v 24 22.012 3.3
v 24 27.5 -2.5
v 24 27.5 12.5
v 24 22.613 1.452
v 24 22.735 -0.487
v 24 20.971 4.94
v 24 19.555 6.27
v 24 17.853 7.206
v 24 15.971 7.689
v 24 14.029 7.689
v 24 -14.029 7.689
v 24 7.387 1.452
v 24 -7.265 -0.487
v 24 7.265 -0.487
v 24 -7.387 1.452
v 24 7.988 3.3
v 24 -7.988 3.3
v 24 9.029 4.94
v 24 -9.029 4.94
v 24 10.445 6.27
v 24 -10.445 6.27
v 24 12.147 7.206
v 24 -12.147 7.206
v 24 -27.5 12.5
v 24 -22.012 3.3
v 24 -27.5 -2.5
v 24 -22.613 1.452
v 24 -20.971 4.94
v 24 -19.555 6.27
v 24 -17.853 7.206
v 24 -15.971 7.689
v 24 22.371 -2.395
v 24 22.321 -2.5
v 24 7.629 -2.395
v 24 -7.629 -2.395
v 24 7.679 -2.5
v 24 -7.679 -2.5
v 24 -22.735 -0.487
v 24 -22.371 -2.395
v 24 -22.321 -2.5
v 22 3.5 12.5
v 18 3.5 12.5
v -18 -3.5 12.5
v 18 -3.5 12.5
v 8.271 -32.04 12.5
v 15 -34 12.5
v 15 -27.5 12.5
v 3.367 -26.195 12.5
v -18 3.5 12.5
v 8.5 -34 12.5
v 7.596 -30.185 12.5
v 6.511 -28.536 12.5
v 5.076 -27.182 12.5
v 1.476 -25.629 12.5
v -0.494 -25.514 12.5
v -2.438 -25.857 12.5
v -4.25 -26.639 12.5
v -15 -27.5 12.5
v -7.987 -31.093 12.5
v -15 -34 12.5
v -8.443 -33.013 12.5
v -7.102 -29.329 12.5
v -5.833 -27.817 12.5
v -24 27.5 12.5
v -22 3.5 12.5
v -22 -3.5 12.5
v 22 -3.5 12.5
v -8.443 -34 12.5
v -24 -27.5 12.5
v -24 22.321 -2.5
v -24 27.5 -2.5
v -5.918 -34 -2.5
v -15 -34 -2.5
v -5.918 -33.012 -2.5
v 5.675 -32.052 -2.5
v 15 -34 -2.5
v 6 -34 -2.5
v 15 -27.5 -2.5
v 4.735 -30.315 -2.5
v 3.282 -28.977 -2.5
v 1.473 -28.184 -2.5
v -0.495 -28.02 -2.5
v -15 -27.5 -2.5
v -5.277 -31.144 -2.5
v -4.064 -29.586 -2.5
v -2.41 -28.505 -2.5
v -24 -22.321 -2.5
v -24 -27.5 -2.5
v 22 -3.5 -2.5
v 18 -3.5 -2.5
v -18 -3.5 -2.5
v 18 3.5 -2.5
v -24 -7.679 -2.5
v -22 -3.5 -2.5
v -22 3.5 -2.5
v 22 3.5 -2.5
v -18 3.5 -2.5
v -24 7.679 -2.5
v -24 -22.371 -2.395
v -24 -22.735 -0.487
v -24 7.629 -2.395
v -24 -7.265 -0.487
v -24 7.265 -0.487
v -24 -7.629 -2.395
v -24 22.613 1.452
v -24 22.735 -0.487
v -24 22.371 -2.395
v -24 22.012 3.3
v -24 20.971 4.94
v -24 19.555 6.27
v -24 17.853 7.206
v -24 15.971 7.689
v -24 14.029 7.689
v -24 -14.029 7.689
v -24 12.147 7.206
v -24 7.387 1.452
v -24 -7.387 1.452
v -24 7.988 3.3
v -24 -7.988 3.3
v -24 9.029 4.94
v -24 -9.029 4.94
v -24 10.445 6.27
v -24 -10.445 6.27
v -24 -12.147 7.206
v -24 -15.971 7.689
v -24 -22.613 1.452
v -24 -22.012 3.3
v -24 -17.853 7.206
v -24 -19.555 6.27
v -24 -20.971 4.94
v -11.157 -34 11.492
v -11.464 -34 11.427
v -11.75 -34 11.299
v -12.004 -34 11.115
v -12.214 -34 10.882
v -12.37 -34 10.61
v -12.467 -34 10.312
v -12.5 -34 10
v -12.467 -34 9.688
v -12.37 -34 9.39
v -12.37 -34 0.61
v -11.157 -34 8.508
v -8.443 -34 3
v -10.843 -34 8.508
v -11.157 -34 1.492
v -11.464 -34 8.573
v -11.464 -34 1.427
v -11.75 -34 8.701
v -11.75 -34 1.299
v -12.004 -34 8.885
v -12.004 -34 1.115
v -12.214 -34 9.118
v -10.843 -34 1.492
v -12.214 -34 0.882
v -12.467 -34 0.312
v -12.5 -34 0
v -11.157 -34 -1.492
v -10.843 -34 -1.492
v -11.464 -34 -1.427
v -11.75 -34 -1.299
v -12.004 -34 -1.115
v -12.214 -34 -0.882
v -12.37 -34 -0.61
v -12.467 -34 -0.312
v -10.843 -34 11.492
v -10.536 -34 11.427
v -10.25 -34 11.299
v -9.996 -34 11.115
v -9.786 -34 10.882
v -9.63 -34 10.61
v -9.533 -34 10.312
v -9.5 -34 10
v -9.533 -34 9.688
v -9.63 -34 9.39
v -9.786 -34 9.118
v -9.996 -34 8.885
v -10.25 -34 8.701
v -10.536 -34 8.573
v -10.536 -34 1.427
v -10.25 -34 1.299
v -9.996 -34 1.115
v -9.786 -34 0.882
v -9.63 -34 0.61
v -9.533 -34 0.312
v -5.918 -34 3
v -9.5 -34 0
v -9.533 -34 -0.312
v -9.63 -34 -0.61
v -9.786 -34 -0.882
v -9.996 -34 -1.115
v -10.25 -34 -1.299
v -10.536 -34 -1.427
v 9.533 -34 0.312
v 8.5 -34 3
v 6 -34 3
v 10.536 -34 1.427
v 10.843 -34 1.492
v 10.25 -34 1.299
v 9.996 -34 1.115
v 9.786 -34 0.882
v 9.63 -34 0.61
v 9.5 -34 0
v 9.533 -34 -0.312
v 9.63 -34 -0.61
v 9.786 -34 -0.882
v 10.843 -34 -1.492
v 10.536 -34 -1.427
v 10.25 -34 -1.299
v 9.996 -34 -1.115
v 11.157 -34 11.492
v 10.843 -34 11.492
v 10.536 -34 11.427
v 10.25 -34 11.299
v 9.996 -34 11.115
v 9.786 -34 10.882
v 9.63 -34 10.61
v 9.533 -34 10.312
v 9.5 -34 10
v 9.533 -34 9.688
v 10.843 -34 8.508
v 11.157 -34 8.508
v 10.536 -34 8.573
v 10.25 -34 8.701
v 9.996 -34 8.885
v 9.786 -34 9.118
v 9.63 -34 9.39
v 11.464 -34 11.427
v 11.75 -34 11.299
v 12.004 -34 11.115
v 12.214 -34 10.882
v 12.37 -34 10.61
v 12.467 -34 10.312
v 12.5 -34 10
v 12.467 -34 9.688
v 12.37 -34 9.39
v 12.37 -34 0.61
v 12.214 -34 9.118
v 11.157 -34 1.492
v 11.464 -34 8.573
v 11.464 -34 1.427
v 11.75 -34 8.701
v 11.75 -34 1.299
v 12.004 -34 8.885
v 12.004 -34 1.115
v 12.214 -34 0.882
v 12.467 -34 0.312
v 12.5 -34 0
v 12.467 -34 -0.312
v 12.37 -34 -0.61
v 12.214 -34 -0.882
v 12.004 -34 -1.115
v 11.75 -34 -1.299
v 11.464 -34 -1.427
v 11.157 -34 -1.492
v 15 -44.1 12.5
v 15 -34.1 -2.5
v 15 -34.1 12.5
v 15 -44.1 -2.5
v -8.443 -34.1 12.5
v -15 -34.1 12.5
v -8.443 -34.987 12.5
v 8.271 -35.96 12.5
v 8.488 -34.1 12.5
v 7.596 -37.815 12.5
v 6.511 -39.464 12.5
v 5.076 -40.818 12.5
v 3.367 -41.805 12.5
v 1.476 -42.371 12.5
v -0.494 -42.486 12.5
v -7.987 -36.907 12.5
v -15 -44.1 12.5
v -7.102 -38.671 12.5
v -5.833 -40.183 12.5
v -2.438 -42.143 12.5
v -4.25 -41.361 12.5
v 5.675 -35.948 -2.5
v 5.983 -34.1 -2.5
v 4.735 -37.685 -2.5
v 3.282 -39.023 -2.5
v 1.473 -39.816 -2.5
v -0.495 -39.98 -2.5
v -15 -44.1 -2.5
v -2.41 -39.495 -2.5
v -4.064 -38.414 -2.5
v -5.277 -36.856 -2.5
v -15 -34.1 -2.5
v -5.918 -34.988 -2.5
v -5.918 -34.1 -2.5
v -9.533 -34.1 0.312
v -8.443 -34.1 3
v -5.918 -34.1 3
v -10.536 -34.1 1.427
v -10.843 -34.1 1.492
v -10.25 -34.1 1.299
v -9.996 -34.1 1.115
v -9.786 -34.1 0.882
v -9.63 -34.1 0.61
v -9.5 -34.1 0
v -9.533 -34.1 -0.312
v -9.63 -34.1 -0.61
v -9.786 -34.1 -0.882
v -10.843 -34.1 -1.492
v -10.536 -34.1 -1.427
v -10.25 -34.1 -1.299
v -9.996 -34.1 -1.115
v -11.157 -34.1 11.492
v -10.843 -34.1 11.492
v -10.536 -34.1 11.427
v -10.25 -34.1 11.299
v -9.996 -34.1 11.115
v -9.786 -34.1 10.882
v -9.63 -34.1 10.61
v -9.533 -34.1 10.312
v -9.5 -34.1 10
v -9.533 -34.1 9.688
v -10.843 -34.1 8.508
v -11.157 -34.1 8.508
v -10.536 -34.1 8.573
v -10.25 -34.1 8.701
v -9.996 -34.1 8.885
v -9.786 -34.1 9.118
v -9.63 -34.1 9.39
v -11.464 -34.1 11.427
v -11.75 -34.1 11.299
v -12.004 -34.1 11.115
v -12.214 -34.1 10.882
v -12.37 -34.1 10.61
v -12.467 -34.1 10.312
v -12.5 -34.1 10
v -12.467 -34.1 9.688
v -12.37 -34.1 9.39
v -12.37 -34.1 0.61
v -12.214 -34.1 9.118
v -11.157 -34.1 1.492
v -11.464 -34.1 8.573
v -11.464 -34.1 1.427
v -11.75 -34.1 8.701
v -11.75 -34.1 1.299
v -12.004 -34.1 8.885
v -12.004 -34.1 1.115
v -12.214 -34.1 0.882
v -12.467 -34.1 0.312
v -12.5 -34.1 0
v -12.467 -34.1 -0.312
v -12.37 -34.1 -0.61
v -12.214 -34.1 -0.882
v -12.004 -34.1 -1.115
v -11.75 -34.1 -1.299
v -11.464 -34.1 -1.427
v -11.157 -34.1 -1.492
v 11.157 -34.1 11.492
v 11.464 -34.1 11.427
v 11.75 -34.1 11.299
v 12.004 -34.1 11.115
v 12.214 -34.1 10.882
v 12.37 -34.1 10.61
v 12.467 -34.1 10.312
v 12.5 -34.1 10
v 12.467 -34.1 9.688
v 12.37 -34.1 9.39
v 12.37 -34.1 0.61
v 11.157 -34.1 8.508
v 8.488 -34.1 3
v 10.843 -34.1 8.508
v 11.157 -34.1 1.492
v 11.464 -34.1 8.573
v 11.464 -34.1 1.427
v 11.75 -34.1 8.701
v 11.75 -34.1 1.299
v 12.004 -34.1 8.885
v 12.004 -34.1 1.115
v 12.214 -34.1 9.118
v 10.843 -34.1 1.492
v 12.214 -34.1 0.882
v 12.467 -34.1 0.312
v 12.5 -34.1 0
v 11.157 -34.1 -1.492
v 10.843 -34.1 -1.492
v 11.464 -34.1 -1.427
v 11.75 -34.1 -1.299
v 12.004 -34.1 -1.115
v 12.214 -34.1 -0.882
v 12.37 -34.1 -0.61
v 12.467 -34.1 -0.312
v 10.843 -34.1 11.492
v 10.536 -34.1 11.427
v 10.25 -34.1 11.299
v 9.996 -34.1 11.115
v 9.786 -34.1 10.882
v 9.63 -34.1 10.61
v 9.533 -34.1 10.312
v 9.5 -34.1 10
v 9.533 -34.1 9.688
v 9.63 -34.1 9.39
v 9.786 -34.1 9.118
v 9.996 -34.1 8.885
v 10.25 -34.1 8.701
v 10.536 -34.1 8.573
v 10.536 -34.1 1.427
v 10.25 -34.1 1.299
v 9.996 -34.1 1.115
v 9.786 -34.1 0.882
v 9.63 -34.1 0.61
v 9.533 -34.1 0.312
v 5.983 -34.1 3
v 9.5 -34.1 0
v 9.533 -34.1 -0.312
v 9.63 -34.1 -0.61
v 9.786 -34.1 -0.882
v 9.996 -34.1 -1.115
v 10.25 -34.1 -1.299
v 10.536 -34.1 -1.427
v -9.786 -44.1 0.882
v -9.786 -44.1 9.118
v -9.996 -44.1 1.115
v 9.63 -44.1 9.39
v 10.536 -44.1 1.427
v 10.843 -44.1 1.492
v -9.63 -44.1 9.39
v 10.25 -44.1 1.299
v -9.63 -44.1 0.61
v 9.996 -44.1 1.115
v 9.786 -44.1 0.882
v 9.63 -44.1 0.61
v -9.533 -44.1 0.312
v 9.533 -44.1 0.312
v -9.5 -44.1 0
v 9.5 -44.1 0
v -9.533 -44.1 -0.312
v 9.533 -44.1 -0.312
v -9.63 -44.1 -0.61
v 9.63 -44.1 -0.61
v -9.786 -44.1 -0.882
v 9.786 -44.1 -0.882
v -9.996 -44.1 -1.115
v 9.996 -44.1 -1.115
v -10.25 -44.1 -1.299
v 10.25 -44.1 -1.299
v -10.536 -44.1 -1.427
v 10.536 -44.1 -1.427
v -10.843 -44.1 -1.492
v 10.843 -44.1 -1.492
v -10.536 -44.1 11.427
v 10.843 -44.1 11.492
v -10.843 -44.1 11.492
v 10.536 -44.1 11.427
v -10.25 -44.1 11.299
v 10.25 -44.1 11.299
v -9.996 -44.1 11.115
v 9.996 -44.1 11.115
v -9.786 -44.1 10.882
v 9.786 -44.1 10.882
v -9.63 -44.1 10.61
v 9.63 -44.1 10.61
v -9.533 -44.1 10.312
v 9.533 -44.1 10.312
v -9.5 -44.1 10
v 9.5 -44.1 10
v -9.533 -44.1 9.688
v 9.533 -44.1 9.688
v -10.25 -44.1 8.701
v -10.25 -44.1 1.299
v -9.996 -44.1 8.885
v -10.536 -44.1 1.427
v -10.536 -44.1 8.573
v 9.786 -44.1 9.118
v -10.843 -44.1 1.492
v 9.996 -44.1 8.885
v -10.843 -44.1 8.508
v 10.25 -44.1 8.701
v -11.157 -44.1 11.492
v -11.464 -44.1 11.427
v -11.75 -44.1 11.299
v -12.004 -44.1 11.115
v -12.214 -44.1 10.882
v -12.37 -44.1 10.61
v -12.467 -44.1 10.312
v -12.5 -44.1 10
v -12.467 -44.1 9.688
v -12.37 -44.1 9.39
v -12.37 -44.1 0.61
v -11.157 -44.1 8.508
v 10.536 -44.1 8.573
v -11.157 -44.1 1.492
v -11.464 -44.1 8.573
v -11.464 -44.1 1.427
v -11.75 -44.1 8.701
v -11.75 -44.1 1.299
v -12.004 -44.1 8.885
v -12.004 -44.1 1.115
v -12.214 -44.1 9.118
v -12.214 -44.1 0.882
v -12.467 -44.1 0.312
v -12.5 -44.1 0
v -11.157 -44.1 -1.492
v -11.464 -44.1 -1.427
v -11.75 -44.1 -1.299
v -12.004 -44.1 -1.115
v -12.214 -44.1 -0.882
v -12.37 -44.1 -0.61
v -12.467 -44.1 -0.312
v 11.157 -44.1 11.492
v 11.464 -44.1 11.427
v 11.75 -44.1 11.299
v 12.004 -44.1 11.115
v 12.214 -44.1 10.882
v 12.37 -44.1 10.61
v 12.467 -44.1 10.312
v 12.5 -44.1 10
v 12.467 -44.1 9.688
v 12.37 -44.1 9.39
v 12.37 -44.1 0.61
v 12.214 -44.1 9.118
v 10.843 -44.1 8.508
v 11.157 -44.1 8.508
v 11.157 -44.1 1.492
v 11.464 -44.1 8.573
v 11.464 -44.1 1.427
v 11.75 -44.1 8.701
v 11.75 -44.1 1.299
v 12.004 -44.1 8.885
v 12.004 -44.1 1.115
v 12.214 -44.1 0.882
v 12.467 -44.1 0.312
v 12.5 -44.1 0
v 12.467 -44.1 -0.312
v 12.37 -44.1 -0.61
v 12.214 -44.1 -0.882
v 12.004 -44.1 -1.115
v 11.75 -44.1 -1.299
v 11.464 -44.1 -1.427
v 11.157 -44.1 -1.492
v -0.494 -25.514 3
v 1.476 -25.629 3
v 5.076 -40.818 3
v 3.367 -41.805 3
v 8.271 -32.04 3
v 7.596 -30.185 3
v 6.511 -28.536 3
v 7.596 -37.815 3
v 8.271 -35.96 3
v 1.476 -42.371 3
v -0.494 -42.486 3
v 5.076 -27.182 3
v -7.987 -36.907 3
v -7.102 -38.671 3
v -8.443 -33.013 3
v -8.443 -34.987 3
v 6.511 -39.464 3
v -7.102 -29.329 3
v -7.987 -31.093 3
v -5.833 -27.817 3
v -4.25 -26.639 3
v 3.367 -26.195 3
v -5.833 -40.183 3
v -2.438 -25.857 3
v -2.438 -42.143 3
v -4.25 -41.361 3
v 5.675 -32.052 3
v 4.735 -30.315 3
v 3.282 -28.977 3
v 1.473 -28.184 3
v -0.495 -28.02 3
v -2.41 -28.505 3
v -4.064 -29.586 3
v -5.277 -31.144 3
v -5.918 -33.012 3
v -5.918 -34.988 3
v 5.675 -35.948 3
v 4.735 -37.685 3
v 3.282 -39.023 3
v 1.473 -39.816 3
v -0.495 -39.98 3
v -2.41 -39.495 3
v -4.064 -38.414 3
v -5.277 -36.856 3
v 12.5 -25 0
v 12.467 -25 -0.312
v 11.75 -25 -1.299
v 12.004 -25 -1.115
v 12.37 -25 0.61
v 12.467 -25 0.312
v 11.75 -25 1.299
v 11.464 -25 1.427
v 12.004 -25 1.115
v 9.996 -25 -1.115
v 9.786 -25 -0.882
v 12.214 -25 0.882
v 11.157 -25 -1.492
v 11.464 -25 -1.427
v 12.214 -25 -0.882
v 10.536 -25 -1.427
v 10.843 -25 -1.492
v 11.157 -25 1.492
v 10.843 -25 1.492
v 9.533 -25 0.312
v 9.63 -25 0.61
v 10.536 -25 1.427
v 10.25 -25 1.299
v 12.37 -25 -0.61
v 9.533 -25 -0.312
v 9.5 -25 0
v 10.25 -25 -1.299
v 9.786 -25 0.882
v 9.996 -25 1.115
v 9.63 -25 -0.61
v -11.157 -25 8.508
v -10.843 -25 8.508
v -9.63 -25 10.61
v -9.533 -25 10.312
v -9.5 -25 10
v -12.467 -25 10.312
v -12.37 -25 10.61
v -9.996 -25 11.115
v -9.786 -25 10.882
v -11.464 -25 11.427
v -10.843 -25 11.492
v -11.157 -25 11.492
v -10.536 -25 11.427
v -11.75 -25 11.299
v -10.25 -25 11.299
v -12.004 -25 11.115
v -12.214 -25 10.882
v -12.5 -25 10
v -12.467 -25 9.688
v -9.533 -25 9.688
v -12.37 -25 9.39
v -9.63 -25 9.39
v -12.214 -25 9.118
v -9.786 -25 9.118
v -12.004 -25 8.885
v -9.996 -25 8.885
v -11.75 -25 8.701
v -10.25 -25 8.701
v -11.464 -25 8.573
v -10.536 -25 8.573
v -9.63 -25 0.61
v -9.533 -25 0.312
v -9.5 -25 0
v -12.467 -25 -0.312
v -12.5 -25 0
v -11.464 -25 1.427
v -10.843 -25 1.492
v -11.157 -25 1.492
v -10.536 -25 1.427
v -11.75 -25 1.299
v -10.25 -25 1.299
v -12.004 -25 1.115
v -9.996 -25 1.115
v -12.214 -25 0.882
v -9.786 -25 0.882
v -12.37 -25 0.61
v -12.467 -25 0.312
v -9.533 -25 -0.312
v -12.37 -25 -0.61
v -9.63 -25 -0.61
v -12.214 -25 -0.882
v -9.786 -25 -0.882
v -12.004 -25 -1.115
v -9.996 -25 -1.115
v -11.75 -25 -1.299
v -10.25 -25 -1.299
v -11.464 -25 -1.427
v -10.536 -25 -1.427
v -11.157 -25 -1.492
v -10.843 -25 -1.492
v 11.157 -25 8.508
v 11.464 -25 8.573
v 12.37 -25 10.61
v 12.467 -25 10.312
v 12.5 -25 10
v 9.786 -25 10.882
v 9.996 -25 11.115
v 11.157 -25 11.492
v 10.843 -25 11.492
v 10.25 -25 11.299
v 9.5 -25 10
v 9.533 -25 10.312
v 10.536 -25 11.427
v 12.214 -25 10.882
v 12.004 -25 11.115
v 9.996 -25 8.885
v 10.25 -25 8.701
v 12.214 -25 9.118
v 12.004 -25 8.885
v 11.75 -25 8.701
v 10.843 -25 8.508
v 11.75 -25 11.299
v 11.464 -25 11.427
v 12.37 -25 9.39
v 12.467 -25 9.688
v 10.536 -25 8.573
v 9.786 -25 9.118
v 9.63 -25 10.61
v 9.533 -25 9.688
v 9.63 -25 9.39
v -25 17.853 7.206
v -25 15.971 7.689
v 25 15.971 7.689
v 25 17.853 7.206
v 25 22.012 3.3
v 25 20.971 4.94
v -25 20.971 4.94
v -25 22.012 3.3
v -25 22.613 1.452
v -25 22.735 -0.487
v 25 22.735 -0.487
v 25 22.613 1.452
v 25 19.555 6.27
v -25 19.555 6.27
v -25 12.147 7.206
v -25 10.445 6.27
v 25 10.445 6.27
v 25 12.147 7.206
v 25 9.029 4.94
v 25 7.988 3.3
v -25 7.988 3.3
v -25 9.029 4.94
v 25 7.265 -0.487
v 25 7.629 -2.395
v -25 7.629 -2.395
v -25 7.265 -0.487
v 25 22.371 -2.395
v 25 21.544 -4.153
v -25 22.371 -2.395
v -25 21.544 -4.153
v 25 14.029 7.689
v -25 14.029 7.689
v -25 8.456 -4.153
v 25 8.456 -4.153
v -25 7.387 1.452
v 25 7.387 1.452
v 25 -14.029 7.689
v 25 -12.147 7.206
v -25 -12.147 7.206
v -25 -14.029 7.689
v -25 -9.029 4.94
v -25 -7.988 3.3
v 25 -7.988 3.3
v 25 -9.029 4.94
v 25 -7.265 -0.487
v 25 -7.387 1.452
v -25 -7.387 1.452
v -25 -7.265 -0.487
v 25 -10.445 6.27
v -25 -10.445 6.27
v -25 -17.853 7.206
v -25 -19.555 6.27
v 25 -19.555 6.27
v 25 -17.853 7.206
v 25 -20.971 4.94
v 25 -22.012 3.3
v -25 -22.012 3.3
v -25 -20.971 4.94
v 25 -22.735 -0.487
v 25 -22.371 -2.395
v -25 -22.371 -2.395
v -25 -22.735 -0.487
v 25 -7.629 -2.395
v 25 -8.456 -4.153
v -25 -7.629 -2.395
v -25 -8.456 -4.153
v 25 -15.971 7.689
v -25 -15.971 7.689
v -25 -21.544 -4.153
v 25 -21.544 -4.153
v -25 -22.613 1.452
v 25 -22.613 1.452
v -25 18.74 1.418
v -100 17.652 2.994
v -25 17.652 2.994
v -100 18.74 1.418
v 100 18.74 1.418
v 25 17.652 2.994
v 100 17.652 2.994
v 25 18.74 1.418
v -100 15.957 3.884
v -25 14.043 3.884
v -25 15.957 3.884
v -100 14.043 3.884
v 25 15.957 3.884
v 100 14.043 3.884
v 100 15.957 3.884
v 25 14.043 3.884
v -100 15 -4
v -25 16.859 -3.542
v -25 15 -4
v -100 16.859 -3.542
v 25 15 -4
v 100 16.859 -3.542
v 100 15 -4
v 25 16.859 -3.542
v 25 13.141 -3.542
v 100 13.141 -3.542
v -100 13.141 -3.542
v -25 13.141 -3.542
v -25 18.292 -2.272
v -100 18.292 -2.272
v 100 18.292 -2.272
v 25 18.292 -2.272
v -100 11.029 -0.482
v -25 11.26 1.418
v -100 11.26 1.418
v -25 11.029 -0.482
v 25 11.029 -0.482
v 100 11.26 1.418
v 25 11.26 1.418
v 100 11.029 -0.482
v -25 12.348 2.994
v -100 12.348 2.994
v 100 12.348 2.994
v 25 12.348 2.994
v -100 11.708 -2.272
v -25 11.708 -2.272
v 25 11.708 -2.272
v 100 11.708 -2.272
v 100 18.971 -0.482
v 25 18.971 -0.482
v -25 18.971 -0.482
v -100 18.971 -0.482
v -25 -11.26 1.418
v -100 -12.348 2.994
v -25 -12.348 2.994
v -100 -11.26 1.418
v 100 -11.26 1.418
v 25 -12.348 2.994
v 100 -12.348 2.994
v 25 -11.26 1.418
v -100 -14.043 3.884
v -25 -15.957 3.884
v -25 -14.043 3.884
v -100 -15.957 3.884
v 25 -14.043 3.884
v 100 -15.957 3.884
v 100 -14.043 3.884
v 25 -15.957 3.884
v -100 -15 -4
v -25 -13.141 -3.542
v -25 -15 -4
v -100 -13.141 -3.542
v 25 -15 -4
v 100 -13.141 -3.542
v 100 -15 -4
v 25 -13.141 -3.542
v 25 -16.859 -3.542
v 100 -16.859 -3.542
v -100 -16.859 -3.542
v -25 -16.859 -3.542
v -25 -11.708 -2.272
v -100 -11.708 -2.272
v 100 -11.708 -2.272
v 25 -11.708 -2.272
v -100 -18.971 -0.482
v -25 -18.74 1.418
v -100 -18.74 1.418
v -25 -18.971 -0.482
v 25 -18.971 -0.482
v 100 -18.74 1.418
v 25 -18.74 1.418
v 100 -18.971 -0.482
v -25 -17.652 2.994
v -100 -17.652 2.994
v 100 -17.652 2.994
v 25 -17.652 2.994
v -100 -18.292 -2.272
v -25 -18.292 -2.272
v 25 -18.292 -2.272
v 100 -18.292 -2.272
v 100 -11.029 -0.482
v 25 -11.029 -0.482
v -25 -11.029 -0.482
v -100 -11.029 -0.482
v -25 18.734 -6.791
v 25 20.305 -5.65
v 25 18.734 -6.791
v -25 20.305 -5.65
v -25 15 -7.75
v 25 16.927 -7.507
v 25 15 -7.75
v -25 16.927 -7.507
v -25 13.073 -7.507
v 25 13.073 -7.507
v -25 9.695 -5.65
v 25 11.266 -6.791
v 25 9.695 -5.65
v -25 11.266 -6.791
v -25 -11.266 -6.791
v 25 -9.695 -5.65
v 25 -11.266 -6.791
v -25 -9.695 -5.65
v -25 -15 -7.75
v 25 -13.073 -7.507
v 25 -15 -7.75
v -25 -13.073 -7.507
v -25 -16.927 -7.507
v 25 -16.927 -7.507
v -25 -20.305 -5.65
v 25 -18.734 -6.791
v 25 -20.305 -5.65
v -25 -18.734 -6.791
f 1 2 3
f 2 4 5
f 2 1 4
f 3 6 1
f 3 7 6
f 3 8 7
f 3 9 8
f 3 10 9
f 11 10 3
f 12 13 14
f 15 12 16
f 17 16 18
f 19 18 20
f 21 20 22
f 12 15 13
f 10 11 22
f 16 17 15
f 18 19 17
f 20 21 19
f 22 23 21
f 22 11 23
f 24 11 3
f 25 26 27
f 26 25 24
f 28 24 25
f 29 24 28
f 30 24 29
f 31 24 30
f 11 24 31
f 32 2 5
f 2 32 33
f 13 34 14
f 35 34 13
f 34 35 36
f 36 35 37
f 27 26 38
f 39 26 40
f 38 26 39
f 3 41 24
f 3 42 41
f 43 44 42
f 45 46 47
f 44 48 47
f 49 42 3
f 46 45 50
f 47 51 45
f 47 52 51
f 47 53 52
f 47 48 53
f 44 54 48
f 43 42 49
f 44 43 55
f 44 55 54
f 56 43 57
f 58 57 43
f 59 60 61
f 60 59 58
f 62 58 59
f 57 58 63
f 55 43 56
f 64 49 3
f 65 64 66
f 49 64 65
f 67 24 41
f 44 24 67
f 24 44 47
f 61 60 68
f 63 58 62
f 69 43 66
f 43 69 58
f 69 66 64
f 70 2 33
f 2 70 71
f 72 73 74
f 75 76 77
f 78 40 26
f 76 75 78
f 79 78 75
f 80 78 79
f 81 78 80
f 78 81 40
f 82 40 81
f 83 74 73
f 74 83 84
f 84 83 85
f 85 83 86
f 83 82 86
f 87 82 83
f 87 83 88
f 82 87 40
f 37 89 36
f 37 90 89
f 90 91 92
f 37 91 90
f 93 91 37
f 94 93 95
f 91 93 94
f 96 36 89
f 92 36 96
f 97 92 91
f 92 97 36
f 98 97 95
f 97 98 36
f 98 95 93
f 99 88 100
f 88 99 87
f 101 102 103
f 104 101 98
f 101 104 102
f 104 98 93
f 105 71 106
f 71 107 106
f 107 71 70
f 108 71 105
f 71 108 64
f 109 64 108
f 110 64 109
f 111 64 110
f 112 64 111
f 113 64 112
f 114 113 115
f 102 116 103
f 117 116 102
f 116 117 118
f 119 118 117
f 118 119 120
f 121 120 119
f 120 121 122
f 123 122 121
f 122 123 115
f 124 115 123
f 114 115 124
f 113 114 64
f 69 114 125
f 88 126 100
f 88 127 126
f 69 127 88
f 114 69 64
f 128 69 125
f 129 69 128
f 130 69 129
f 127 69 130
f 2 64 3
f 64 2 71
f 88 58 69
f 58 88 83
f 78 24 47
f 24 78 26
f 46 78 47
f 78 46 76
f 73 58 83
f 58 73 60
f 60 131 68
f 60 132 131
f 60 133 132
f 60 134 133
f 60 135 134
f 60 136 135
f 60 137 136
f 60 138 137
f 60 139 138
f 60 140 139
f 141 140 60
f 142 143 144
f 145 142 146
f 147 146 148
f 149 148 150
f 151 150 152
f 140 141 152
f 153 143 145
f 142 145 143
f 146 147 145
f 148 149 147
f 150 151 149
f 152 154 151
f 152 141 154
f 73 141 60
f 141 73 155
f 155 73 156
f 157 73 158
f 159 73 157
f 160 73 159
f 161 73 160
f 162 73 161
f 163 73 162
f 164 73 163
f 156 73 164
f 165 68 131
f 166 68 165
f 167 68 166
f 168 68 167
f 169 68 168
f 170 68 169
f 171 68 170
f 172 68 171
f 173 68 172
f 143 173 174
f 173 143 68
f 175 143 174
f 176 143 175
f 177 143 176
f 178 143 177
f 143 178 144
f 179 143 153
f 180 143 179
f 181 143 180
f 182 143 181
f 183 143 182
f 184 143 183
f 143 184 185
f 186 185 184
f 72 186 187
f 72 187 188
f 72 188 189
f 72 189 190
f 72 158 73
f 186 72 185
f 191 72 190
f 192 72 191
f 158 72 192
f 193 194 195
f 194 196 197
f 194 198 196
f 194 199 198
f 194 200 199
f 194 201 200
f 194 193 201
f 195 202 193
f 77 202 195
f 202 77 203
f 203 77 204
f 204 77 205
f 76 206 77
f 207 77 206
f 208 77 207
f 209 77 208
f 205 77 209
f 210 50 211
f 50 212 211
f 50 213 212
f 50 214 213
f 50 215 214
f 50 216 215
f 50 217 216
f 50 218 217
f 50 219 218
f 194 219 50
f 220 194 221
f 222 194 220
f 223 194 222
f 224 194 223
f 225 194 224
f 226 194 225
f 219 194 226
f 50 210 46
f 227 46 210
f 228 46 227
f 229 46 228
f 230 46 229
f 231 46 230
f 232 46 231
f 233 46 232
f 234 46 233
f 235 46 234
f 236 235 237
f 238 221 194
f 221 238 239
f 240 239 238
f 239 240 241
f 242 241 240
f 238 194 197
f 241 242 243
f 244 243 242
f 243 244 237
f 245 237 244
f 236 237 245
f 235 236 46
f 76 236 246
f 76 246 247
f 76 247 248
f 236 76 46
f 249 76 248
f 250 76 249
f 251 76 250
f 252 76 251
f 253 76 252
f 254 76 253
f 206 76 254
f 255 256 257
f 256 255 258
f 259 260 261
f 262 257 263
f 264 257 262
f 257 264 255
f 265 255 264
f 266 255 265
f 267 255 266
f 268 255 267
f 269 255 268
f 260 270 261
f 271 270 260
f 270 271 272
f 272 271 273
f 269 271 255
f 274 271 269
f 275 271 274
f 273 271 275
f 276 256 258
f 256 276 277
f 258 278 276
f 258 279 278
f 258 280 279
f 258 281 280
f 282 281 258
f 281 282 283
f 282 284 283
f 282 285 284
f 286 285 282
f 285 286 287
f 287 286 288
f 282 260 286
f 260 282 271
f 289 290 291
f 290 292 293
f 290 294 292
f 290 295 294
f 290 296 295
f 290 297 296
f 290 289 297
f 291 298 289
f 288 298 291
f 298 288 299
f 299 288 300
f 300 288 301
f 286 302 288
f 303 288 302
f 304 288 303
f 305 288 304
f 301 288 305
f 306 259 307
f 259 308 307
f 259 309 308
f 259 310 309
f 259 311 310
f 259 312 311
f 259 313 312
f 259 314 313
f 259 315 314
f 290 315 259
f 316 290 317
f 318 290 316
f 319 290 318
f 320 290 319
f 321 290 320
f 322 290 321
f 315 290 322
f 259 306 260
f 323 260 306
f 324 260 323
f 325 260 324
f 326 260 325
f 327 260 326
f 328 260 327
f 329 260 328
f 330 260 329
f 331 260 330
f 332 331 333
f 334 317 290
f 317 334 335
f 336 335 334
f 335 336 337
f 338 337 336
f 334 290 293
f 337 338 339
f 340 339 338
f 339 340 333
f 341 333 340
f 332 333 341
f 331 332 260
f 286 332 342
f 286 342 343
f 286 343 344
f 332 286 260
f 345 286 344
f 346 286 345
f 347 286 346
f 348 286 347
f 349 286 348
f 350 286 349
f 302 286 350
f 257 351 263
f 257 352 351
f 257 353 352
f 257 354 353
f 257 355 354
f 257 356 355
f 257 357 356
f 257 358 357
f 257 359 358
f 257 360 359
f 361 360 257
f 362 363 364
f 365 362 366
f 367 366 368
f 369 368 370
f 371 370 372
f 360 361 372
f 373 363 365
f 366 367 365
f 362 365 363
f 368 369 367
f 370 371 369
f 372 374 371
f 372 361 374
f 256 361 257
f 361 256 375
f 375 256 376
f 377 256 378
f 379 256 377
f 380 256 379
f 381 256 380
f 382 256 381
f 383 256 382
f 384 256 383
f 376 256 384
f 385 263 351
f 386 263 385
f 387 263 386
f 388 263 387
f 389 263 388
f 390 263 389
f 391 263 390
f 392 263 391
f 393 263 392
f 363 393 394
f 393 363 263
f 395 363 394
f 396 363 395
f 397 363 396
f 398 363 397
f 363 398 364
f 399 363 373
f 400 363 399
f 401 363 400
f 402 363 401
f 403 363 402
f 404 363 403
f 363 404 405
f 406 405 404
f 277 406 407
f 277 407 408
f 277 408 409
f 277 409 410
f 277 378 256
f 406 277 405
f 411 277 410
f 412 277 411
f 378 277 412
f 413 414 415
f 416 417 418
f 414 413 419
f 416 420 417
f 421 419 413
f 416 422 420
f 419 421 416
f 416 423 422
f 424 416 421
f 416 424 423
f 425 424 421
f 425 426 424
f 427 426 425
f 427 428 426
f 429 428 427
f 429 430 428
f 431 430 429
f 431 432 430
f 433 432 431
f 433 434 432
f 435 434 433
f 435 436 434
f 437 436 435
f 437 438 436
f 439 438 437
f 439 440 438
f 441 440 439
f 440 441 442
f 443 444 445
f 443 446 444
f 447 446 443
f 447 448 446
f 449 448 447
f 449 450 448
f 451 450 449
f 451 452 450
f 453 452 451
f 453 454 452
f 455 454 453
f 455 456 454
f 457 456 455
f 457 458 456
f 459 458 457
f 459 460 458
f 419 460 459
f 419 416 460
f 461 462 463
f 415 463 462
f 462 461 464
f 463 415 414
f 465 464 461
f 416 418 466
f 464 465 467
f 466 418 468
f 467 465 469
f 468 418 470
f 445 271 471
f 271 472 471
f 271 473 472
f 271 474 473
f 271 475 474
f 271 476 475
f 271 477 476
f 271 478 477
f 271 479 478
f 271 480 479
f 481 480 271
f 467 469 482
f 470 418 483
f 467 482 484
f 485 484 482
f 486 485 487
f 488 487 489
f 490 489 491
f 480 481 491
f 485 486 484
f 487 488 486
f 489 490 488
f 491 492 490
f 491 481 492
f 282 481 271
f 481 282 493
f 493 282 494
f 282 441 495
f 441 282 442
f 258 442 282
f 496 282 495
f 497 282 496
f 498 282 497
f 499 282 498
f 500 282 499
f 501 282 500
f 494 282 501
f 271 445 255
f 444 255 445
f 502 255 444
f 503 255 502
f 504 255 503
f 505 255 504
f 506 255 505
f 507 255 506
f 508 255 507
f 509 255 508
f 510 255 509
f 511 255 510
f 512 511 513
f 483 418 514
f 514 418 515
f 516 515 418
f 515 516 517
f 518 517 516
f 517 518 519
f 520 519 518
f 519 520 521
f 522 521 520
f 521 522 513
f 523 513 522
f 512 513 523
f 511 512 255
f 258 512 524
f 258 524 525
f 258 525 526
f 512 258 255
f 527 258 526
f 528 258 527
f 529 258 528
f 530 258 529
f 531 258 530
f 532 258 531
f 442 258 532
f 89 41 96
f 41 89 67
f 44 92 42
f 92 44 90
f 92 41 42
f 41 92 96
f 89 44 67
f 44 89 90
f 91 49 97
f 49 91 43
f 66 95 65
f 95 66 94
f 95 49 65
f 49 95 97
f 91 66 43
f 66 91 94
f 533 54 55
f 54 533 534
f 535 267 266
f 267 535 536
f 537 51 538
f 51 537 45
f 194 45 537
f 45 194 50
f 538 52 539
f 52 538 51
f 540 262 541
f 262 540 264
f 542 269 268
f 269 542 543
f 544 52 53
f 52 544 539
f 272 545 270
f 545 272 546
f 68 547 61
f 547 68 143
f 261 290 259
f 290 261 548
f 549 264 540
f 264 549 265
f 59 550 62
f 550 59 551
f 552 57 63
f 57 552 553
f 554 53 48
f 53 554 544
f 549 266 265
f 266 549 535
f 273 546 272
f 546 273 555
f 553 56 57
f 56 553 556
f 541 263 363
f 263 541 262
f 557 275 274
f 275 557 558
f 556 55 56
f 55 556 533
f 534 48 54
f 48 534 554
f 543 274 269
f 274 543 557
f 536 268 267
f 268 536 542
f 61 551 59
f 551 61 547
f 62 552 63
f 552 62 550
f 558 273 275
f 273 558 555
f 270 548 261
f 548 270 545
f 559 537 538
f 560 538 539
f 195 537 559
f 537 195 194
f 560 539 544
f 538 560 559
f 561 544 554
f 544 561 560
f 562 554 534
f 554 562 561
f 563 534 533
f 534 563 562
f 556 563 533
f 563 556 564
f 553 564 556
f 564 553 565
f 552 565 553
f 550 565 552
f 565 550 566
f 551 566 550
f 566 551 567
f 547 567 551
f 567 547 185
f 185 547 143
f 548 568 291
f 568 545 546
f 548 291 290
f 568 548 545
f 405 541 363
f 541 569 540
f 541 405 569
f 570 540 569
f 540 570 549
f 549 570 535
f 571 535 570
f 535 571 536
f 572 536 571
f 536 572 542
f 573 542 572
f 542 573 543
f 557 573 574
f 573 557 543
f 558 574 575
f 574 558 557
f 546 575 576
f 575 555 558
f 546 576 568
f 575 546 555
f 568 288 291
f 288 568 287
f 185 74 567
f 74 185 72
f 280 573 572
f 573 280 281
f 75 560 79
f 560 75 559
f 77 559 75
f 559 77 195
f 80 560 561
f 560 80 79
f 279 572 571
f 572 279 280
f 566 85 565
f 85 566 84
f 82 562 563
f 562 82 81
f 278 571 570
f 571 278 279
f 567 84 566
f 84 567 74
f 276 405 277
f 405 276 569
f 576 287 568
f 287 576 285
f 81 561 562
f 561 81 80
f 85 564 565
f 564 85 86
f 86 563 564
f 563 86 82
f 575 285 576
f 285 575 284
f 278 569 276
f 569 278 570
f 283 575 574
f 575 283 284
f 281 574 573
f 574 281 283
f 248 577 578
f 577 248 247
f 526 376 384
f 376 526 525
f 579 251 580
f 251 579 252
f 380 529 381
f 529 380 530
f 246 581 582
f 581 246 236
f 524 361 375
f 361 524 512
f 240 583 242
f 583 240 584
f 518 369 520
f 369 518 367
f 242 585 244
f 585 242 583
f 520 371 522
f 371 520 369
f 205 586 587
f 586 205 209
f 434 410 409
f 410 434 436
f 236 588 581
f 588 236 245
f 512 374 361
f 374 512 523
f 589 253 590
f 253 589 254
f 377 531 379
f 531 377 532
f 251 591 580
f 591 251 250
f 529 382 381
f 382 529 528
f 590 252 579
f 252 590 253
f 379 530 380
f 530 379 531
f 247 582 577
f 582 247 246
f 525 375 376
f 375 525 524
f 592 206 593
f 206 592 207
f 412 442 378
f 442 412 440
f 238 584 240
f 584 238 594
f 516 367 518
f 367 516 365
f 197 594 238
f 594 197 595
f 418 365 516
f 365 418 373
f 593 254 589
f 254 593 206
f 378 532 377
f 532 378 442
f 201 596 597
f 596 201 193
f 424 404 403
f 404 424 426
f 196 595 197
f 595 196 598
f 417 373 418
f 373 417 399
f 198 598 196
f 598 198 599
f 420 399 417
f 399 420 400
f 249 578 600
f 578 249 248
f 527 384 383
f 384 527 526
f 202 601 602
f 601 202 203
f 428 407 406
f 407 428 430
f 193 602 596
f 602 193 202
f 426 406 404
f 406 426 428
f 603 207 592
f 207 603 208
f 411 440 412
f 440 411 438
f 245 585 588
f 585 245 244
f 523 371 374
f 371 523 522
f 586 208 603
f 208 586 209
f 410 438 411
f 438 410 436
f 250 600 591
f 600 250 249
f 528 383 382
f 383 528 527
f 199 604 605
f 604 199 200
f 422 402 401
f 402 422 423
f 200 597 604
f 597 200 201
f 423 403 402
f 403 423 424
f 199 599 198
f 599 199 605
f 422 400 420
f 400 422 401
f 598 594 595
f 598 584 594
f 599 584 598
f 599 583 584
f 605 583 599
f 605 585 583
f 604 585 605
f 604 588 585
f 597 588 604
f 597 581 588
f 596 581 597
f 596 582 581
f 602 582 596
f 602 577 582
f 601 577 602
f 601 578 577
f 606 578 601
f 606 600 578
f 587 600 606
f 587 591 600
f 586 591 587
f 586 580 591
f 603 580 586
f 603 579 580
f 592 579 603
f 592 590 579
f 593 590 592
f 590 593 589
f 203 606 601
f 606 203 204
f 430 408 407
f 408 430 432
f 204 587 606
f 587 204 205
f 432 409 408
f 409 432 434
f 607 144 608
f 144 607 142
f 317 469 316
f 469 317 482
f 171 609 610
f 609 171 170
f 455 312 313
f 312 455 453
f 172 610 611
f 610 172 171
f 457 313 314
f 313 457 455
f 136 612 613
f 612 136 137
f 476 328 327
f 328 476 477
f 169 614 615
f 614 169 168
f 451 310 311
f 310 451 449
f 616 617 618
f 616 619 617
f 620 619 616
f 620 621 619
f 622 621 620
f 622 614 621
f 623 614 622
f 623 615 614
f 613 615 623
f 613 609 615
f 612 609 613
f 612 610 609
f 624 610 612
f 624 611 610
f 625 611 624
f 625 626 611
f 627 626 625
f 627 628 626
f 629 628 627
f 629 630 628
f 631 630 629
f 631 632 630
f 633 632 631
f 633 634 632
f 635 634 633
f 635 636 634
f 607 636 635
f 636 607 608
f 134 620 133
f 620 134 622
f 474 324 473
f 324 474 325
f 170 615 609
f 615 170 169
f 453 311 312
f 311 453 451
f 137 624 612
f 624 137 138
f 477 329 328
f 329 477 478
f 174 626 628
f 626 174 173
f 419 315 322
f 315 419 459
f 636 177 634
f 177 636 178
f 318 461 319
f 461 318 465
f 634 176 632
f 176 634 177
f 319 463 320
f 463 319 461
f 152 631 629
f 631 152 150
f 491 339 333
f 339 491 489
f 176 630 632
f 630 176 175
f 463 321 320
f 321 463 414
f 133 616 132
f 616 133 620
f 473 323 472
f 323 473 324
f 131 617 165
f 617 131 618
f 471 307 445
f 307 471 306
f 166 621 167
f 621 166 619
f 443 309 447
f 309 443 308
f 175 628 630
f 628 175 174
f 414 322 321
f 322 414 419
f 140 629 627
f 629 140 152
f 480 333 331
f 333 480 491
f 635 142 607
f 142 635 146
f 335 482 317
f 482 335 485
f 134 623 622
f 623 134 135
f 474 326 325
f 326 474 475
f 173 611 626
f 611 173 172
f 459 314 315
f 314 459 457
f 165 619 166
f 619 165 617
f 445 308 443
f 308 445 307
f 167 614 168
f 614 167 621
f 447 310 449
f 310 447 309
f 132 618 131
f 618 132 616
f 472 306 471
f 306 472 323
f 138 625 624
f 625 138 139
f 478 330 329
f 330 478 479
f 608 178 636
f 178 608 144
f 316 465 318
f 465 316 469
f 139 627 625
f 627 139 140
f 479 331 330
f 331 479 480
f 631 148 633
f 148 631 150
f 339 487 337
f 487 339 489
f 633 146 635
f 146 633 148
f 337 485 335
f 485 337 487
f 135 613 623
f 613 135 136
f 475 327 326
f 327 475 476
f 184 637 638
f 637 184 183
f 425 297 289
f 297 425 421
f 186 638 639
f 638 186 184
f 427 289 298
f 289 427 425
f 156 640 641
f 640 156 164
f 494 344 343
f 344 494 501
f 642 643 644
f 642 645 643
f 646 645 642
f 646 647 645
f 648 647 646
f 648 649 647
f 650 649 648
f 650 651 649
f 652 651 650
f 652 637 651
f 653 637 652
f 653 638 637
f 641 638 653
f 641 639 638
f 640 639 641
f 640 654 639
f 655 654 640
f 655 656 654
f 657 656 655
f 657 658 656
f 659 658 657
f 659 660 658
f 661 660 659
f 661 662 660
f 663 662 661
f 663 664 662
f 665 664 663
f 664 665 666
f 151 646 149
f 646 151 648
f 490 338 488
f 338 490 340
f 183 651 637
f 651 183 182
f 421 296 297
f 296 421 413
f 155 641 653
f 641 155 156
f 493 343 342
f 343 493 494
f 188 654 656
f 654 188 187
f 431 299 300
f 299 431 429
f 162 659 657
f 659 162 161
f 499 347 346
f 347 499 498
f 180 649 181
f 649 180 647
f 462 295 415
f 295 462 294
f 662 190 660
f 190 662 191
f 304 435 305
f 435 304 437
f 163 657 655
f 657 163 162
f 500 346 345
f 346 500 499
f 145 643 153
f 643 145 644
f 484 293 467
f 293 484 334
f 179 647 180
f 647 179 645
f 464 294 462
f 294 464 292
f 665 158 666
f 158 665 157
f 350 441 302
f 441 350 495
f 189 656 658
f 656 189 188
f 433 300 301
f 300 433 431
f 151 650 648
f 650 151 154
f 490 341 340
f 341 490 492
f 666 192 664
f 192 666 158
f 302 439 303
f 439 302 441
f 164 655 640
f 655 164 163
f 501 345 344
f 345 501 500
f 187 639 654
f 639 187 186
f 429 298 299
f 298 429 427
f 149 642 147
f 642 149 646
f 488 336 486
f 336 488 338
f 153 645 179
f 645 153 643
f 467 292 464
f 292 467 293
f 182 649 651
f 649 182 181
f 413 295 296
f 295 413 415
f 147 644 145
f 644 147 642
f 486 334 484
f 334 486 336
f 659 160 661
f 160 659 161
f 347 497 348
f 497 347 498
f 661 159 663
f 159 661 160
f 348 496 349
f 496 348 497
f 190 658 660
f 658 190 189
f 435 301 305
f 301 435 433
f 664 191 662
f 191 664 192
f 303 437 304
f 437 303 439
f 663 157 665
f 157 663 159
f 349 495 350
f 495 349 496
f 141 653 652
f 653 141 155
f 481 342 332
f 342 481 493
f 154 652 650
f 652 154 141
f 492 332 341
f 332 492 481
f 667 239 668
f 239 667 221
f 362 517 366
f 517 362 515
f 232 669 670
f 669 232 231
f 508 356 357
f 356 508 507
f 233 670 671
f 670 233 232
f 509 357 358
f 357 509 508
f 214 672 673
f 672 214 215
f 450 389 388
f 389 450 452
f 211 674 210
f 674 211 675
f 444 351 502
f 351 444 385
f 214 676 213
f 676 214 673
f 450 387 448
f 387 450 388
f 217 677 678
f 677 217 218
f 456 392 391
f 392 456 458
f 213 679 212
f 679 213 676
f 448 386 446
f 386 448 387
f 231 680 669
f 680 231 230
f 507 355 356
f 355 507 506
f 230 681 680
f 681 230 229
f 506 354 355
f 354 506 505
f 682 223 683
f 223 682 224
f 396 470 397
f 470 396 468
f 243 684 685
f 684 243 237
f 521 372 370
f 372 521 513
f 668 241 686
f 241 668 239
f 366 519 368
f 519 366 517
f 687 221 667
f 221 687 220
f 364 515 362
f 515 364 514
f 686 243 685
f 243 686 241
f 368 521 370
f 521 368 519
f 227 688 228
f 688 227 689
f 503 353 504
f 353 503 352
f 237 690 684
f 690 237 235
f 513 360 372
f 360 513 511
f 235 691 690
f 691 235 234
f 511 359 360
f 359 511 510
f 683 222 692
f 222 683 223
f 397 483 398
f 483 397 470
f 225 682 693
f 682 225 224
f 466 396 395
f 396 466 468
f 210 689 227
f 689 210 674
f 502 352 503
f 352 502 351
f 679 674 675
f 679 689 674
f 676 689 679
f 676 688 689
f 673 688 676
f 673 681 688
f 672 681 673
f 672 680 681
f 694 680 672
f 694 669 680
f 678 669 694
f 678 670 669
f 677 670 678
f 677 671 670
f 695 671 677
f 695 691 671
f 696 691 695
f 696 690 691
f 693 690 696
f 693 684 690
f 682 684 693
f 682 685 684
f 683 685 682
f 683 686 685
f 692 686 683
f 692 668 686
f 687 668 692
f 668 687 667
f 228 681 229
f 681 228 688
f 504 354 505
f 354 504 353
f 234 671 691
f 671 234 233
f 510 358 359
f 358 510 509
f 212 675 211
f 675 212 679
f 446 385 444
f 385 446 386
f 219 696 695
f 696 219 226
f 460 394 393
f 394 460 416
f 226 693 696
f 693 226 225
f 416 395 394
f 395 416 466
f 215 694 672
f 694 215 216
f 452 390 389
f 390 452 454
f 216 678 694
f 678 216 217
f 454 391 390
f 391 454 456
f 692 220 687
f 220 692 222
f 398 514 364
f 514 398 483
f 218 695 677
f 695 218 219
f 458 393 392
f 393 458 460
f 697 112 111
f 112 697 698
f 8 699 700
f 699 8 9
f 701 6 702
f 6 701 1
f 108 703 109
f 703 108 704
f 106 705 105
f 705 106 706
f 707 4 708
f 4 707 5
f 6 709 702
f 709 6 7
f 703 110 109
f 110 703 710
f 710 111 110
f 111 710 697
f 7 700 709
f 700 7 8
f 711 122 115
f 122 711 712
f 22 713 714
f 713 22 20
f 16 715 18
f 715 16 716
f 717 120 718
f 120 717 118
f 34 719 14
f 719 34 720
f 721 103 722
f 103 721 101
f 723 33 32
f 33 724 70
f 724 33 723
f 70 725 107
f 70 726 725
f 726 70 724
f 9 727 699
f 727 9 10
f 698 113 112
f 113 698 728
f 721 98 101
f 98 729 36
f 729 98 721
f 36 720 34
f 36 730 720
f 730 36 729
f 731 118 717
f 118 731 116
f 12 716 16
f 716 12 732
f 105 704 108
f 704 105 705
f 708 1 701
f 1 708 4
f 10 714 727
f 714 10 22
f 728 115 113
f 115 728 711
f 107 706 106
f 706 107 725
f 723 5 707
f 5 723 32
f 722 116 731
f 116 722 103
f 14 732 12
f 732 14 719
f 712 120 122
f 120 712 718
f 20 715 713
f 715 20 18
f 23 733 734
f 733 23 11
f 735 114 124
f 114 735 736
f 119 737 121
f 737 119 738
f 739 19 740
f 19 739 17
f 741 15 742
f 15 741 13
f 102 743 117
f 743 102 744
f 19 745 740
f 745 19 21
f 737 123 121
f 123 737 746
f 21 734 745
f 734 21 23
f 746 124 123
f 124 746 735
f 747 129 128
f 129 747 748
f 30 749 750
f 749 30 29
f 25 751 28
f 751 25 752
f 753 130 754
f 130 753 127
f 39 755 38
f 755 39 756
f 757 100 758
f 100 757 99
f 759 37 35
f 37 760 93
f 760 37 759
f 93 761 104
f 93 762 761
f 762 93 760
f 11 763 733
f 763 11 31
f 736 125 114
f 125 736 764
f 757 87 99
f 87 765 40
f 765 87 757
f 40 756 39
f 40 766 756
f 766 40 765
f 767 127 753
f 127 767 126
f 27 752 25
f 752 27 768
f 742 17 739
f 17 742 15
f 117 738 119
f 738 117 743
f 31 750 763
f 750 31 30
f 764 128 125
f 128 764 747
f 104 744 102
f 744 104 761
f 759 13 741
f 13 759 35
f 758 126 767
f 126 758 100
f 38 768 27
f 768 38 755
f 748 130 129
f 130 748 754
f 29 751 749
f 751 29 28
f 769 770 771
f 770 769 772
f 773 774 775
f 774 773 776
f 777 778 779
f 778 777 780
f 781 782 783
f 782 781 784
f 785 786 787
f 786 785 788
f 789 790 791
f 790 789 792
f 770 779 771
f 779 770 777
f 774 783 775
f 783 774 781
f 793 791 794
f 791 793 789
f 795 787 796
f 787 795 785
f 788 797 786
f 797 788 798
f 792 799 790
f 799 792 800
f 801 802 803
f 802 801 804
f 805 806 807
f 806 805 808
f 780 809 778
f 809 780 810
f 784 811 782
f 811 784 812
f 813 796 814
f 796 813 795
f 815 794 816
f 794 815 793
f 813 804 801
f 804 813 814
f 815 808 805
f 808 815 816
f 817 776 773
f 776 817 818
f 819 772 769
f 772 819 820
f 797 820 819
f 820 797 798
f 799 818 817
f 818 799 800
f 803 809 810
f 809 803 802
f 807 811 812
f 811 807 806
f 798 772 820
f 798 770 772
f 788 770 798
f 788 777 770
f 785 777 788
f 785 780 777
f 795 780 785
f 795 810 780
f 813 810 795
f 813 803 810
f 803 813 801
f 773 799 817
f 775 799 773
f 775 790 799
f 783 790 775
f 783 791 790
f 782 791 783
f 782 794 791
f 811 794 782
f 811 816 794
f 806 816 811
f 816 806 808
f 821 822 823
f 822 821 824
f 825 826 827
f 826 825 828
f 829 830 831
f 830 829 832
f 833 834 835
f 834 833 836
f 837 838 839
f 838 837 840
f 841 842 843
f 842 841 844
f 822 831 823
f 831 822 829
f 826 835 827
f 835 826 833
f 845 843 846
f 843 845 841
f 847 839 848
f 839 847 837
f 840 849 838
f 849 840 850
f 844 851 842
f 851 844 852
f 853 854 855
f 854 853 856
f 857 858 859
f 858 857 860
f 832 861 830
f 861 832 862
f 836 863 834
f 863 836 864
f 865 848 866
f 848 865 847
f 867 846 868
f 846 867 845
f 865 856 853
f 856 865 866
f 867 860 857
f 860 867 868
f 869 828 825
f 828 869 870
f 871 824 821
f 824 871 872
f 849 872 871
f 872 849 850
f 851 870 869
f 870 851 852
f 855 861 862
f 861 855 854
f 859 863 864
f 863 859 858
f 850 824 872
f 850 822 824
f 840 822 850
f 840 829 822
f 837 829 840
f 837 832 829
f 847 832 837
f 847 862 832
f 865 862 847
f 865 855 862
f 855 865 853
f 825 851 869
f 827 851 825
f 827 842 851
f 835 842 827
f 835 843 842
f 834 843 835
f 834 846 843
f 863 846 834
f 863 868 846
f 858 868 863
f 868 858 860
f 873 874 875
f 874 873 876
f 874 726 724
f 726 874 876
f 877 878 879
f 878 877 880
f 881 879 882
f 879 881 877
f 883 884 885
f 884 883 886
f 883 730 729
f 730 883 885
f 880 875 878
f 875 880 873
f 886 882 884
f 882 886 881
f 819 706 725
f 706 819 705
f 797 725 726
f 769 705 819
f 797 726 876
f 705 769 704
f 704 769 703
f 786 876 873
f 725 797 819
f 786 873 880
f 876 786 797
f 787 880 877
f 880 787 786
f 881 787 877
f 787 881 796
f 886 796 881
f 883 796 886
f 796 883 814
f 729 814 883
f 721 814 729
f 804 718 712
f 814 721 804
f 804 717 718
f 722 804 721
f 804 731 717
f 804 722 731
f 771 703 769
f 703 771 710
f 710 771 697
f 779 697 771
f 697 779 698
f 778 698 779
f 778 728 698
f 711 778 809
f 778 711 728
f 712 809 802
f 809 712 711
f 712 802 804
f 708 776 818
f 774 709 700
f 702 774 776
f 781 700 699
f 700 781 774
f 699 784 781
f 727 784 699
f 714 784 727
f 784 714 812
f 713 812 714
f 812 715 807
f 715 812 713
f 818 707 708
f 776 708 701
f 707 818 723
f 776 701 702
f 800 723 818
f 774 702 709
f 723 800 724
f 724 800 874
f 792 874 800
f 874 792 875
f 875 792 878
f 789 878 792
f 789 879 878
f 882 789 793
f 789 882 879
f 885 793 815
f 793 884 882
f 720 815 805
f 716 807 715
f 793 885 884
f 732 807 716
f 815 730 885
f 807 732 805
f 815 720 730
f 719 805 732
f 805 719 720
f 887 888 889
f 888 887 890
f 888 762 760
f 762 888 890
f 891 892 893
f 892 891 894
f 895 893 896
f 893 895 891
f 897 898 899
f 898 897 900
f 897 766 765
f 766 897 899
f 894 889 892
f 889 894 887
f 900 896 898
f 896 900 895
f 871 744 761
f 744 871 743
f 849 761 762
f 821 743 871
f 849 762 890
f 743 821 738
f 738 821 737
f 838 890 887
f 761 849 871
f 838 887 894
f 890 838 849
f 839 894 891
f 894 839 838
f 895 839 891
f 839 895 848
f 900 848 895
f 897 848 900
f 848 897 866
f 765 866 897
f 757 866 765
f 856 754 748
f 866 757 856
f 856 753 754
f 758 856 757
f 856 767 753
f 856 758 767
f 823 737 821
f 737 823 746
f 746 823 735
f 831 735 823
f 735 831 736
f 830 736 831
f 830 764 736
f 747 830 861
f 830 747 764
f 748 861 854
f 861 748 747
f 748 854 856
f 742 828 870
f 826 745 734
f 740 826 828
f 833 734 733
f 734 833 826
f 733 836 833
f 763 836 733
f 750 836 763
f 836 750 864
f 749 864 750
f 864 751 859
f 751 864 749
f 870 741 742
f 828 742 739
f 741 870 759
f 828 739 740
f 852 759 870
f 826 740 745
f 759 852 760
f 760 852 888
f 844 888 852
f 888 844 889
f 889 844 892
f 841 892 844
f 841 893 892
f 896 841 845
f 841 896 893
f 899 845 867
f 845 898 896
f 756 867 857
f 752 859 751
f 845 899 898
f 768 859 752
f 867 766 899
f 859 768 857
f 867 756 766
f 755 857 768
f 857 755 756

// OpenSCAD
// file: lib.scad
module lm8uu(){
    cylinder(d=15.25,h=24);
}


module nemaHoles(){
    $fn=30;
    
    translate([31/2,31/2,-5])
    cylinder(d=3,h=10);
    
    translate([-31/2,31/2,-5])
    cylinder(d=3,h=10);
    
    translate([31/2,-31/2,-5])
    cylinder(d=3,h=10);
    
    translate([-31/2,-31/2,-5])
    cylinder(d=3,h=10);
    
    translate([0,0,-5])
    cylinder(d=25,h=10);
}
// main file
use <lib.scad>

module rods(){
    color("Silver"){
        translate([-100,15,-0])
        rotate([0,90,0])
        cylinder(d=8,h=200);
        
        translate([-100,-15,0])
        rotate([0,90,0])
        cylinder(d=8,h=200);
    }
    
    color("Gray"){
        //lm8uu
        translate([-25,15,0])
        rotate([0,90,0])
        cylinder(d=15.5,h=50);
        
        translate([-25,-15,0])
        rotate([0,90,0])
        cylinder(d=15.5,h=50);
    }
}

module xCarriage(){
    difference(){
        union(){
            translate([0,0,5])
            cube([48,55,15],center=true);
            
            translate([0,-29,5])
            cube([30,10,15],center=true);
            
            translate([0,-39.1,5])
            cube([30,10,15],center=true);
        }
        
        translate([20,0,0])
        cube([4,7,30],center=true);
        
        translate([-20,0,0])
        cube([4,7,30],center=true);
   
        translate([0,-34,3])
        cylinder(d=17,h=15);
        
        translate([0,-34,-3])
        cylinder(d=12,h=6.1);
        
        translate([11,-25,0])
        rotate([90,0,0])
        cylinder(d=3,h=20,$fn=30);
        
        translate([-11,-25,10])
        rotate([90,0,0])
        cylinder(d=3,h=20,$fn=30);
        
        translate([-11,-25,0])
        rotate([90,0,0])
        cylinder(d=3,h=20,$fn=30);
        
        translate([11,-25,10])
        rotate([90,0,0])
        cylinder(d=3,h=20,$fn=30);
        
        //lm8uu
        translate([-25,15,0])
        rotate([0,90,0])
        cylinder(d=15.5,h=50);
        
        translate([-25,-15,0])
        rotate([0,90,0])
        cylinder(d=15.5,h=50);
    }
    
}

xCarriage();
rods();
